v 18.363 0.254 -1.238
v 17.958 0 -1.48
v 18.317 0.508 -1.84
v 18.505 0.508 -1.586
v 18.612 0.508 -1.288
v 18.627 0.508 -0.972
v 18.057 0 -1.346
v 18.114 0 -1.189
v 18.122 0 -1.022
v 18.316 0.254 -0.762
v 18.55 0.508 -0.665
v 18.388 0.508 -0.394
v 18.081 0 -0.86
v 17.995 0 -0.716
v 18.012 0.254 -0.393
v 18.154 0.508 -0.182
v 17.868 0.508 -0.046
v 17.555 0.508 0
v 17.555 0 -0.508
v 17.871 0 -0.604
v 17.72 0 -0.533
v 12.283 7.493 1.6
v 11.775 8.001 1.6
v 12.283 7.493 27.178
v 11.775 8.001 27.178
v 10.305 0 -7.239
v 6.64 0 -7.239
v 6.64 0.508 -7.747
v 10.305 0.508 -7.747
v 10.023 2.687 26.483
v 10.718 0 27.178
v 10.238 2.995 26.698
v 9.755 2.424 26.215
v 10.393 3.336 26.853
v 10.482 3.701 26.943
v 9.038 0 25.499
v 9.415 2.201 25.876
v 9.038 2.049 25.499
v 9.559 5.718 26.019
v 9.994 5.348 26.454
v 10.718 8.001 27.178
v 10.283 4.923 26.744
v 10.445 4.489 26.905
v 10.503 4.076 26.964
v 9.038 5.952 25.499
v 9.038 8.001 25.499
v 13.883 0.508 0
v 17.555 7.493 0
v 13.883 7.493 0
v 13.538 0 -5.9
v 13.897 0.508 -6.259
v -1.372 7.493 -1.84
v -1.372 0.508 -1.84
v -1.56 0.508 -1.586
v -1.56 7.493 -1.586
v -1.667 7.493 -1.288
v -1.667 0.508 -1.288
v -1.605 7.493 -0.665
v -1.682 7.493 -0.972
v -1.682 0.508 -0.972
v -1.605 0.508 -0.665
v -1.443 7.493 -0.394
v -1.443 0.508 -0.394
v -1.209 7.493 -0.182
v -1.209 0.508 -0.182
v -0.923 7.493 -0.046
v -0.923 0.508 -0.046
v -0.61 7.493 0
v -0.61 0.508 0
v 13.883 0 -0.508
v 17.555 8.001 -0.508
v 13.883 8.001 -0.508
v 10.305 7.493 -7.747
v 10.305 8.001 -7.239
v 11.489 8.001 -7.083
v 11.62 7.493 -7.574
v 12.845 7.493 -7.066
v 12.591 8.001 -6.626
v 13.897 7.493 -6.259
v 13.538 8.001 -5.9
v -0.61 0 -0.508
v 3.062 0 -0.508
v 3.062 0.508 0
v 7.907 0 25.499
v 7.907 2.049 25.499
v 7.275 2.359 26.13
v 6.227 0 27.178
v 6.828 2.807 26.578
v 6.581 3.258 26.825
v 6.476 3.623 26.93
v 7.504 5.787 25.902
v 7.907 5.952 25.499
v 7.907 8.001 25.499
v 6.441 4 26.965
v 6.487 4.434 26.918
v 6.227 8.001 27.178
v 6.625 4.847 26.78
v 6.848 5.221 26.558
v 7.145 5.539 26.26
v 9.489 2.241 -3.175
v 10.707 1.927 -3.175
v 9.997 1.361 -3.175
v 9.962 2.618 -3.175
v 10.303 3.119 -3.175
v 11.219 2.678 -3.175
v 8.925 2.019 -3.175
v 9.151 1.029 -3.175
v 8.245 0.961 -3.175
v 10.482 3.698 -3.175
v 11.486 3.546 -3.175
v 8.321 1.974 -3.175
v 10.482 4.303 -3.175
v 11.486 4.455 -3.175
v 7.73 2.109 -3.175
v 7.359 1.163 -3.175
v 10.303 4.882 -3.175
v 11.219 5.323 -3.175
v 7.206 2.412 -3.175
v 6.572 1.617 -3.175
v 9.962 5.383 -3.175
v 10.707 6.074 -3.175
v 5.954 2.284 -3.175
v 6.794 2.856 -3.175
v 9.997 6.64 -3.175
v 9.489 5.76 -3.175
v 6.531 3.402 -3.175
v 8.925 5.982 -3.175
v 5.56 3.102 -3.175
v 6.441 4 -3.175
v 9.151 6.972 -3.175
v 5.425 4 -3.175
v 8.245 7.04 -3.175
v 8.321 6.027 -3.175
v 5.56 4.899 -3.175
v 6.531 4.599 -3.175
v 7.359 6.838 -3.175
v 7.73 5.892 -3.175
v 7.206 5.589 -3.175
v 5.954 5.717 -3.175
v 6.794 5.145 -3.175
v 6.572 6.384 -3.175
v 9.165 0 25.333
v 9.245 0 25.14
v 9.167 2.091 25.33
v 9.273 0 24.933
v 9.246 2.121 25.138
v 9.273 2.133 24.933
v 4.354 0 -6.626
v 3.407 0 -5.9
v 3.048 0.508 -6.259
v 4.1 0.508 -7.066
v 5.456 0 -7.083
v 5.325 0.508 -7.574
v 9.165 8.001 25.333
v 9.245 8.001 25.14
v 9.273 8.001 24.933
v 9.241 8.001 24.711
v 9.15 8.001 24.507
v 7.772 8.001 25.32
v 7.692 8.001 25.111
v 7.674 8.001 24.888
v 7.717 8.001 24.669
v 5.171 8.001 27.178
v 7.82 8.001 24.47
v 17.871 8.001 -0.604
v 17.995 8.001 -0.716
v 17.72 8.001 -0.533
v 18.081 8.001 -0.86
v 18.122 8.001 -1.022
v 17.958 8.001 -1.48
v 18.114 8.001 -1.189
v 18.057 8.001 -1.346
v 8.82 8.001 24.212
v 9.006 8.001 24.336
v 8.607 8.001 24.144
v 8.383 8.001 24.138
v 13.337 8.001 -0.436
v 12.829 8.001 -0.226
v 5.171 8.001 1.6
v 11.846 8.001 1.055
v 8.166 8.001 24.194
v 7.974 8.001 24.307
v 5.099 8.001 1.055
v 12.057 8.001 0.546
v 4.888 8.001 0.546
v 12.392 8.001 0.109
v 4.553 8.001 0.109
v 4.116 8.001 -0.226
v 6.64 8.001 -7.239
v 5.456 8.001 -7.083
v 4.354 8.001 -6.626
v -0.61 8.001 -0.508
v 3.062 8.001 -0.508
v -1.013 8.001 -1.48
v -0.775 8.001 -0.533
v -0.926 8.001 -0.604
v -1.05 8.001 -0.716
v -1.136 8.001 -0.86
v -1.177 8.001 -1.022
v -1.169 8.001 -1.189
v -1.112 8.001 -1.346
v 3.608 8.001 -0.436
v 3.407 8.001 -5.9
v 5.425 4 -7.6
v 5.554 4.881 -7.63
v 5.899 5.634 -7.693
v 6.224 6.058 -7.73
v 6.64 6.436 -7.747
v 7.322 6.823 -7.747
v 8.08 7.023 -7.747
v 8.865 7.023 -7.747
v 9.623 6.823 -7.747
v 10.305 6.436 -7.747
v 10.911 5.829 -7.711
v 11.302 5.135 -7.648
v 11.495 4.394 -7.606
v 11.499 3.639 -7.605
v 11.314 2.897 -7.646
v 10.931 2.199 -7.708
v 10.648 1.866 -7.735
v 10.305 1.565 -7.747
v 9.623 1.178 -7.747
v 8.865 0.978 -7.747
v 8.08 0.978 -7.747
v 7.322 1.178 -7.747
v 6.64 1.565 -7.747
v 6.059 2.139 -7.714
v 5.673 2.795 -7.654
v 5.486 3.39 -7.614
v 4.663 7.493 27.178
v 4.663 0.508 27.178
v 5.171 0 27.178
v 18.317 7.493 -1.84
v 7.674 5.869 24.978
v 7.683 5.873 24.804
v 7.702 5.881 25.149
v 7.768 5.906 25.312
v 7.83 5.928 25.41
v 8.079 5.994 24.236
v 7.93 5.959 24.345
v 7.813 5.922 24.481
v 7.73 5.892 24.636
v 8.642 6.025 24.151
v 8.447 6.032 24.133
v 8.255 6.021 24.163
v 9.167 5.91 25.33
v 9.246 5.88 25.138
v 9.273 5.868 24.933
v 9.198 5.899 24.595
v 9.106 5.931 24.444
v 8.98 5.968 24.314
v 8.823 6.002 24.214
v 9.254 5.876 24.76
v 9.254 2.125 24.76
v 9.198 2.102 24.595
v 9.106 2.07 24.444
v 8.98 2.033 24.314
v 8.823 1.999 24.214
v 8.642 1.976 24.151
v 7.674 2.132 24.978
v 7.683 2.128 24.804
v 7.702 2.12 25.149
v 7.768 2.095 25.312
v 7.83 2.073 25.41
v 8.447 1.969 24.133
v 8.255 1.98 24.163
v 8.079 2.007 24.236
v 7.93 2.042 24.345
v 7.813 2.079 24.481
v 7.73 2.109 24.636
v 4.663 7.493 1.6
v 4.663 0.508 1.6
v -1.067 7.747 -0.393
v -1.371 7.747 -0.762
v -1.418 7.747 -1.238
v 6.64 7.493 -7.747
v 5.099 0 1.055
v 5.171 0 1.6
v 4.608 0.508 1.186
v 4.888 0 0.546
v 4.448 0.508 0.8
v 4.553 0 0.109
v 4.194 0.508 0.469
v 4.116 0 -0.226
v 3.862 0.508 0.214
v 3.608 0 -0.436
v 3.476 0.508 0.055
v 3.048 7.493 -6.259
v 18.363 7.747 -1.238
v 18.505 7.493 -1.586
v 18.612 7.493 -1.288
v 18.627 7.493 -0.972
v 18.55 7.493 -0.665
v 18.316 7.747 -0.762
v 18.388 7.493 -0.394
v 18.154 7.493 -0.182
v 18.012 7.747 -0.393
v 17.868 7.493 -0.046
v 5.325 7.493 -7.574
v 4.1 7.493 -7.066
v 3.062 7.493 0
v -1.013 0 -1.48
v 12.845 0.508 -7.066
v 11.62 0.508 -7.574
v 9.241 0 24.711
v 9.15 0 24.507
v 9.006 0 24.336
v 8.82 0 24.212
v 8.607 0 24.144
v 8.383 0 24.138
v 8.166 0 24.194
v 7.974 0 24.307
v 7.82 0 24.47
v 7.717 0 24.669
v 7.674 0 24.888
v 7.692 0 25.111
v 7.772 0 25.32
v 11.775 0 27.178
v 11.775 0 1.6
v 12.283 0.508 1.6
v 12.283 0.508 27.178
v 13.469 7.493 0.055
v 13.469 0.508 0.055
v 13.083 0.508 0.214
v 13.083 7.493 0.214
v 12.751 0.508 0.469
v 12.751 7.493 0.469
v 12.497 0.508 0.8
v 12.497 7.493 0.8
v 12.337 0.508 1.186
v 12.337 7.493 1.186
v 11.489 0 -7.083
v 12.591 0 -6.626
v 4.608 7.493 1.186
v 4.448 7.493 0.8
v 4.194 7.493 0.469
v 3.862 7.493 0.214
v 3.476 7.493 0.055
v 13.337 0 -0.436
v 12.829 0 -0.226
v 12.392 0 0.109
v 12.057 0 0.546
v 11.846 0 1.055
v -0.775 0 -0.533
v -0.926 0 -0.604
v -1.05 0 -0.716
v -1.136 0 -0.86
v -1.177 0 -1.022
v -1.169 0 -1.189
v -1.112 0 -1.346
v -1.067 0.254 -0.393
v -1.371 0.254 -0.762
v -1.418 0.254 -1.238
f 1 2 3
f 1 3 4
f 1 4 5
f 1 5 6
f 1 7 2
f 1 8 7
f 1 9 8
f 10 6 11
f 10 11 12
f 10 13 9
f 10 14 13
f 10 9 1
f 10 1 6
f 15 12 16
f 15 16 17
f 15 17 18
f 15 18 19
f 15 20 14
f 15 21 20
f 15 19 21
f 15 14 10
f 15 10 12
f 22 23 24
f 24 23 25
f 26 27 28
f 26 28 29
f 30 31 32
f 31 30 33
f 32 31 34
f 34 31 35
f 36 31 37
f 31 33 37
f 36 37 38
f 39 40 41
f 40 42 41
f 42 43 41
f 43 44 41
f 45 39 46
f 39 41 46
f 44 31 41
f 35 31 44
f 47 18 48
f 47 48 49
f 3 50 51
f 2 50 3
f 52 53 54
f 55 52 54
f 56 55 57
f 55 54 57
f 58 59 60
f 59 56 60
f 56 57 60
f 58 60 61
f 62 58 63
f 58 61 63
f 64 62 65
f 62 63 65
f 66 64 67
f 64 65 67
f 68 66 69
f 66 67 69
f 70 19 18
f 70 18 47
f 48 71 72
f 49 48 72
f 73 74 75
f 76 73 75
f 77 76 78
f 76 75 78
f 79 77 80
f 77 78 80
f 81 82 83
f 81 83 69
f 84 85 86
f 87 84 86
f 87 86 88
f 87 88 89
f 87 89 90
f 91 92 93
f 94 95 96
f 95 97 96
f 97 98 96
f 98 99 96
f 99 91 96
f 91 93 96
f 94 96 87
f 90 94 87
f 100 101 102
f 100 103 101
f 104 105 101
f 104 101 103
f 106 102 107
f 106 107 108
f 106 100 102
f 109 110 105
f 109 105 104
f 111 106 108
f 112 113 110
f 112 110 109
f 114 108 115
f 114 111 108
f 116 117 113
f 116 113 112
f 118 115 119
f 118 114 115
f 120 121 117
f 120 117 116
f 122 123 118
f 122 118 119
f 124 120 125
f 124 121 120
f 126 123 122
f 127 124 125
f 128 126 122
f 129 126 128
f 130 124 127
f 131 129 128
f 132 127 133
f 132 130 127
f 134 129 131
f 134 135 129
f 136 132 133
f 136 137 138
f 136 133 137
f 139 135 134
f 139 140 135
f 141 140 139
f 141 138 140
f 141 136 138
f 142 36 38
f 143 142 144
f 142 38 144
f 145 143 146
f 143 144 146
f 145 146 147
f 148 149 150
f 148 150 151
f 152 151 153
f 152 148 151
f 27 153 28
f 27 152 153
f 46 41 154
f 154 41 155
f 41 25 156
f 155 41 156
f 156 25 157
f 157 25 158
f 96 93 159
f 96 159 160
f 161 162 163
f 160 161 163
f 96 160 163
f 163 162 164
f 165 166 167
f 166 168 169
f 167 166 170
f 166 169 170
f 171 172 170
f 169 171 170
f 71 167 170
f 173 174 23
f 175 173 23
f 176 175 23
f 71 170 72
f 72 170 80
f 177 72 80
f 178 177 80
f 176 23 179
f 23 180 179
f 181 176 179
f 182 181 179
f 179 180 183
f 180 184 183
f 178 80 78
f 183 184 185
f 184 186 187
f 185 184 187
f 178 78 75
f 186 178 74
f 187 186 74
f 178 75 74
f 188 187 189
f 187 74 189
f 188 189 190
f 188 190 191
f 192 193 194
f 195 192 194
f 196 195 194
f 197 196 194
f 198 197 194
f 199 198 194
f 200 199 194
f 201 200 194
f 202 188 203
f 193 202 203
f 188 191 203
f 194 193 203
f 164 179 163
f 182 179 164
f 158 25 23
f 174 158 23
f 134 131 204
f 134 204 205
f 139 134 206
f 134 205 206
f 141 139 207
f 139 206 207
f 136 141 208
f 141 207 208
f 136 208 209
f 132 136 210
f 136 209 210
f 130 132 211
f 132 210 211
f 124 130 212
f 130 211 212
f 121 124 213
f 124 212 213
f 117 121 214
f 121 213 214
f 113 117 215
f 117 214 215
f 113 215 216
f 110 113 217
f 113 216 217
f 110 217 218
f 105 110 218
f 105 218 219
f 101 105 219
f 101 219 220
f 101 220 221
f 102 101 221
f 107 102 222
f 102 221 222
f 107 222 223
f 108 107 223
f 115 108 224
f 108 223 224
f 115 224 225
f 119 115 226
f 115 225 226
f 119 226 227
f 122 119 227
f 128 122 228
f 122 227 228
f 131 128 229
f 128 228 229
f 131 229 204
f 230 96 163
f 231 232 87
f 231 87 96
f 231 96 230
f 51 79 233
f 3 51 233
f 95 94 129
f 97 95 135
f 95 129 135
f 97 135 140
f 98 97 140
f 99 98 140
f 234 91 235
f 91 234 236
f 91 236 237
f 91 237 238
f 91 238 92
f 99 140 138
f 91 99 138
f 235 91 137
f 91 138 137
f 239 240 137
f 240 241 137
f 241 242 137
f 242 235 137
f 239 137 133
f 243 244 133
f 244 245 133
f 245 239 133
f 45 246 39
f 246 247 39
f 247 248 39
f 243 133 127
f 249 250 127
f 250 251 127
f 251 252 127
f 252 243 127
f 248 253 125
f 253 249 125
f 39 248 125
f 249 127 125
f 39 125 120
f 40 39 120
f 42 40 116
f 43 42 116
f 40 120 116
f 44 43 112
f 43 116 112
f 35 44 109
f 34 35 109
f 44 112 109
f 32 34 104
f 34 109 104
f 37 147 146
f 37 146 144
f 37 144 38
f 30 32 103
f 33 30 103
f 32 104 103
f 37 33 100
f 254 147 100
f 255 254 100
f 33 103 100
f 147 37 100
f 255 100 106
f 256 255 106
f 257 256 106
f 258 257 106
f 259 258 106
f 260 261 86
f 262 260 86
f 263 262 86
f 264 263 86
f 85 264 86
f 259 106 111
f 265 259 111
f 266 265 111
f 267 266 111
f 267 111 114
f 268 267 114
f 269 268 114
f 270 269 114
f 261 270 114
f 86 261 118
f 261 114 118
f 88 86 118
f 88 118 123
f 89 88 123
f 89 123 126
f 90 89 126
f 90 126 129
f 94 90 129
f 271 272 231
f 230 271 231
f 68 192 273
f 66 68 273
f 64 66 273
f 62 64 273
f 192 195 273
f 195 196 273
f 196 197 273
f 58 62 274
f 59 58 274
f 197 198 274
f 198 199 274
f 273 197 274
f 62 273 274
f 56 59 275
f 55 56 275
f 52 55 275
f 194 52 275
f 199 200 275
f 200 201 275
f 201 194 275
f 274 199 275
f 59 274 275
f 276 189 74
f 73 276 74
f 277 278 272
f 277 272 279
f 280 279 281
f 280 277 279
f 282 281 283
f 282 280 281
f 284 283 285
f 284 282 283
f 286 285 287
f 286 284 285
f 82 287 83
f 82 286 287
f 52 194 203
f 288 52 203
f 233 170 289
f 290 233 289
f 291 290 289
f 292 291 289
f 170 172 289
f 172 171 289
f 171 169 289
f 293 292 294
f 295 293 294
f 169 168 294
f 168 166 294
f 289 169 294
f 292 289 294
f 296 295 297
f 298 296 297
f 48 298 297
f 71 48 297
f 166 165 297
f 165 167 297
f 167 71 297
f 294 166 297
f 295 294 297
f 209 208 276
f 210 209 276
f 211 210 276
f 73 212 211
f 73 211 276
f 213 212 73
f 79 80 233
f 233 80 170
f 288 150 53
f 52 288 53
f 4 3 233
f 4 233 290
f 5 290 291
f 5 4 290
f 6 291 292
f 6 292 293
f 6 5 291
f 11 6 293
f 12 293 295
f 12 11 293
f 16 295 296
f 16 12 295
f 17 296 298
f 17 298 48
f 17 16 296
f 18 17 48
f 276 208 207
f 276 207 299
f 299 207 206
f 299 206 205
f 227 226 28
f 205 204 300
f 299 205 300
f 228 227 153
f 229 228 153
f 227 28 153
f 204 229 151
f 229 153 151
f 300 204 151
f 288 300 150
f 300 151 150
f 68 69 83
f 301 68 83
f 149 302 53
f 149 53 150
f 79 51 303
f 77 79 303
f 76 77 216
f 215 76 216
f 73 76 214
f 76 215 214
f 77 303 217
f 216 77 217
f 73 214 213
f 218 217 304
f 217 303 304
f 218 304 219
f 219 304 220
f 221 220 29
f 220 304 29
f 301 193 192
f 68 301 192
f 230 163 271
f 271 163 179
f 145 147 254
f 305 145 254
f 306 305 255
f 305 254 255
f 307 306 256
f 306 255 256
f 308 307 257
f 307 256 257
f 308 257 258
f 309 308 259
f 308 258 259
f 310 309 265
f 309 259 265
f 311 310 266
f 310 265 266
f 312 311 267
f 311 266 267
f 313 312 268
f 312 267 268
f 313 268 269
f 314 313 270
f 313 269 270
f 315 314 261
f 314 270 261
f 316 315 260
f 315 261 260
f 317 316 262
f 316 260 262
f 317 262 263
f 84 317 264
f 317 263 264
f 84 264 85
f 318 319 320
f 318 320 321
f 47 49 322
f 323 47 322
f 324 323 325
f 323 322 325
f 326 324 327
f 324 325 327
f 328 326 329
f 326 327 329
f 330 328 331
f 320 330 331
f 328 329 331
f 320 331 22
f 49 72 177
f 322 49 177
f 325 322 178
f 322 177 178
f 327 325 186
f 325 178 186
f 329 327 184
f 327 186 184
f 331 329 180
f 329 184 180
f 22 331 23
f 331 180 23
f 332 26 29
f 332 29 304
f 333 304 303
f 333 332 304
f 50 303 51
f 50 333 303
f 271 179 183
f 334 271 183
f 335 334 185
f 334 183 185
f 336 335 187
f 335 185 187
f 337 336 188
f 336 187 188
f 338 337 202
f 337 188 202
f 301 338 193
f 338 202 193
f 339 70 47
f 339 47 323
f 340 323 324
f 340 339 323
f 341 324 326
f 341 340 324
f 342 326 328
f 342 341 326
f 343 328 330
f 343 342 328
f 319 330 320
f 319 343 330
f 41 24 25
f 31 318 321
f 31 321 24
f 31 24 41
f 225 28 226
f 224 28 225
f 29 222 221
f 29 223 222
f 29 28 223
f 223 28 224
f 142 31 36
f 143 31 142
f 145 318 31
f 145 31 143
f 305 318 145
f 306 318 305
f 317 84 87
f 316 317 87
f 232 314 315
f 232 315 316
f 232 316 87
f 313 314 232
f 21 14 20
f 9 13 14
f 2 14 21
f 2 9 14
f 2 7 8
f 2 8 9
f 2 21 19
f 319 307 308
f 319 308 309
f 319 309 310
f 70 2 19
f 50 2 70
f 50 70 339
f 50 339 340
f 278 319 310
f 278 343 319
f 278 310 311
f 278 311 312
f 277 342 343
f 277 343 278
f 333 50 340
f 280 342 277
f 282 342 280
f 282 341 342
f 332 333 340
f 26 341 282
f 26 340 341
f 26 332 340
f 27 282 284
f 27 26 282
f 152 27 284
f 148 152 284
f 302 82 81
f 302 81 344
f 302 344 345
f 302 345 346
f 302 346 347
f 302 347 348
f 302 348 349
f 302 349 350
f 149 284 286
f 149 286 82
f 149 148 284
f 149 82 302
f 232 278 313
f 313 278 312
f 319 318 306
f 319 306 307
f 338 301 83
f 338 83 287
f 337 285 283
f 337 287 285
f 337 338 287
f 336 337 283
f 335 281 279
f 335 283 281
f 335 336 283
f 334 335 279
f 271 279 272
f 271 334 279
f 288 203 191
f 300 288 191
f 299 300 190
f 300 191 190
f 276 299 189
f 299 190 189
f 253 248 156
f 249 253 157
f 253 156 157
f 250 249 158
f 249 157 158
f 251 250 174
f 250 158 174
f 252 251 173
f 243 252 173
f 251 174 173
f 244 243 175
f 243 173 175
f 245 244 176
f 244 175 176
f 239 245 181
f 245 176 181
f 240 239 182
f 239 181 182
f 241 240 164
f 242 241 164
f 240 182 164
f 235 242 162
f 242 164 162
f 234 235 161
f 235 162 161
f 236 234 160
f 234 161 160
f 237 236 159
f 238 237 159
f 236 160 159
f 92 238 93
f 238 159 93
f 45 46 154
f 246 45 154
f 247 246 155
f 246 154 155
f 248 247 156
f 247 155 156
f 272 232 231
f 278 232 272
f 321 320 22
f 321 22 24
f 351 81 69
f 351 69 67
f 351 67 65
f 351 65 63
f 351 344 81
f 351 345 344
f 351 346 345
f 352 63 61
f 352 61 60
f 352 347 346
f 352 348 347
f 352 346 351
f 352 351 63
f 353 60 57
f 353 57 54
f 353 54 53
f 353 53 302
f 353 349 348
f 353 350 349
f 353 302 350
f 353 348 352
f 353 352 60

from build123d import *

# Parameters (mm, degrees)
SKETCH1_R           = 1.077630735
BOSS_EXTRUDE1_DEPTH = 8.001
SKETCH4_R           = 2.032
CUT_EXTRUDE1_DEPTH  = 50.8
SKETCH5_R           = 3.048
CUT_EXTRUDE2_DEPTH  = 4.572
CUT_EXTRUDE4_DEPTH  = 34.909144773
FILLET2_R           = 5.08
FILLET3_R           = 1.6002
CHAMFER1_SIZE       = 0.508


with BuildPart() as part:
    # Sketch1 → Boss-Extrude1 (new body)
    with BuildSketch(Plane(origin=(0, 0, 0), x_dir=(1, 0, 0), z_dir=(0, 1, 0))):
        with BuildLine():
            Line((-0.609859659, 0), (0, 0))
            Line((0, 0), (4.662509606, 0))
            Line((4.662509606, 0), (4.662509606, -27.178))
            Line((4.662509606, -27.178), (8.472509606, -27.178))
            Line((8.472509606, -27.178), (8.472509606, 7.747))
            Line((8.472509606, 7.747), (4.535509606, 7.747))
            Line((4.535509606, 7.747), (-1.371859637, 1.839630756))
            ThreePointArc((-1.371859637, 1.839630756), (-0.197468217, 2.073231708), (0.467771075, 1.077630735))
            ThreePointArc((0.467771075, 1.077630735), (0.152140341, 0.315630735), (-0.609859659, 0))
        make_face()
        with Locations((-0.609859659, 1.077630735)):
            Circle(SKETCH1_R)
    boss_extrude1 = extrude(amount=BOSS_EXTRUDE1_DEPTH)

    # Mirror1: Boss-Extrude1 across plane
    add(boss_extrude1.mirror(Plane(origin=(8.472509606, 0, 0), x_dir=(0, 0, 1), z_dir=(1, 0, 0))))

    # Sketch4 → Cut-Extrude1 (cut)
    with BuildSketch(Plane(origin=(0, 0, -7.747), x_dir=(-1, 0, 0), z_dir=(0, 0, -1))):
        with Locations((-8.472509606, 4.0005)):
            Circle(SKETCH4_R)
    extrude(amount=-CUT_EXTRUDE1_DEPTH, mode=Mode.SUBTRACT)

    # Sketch5 → Cut-Extrude2 (cut)
    with BuildSketch(Plane(origin=(0, 0, -7.747), x_dir=(-1, 0, 0), z_dir=(0, 0, -1))):
        with Locations((-8.472509606, 4.0005)):
            Circle(SKETCH5_R)
    extrude(amount=-CUT_EXTRUDE2_DEPTH, mode=Mode.SUBTRACT)

    # Sketch7 → Cut-Extrude4 (cut, through all)
    with BuildSketch(Plane(origin=(0, 8.001, 0), x_dir=(1, 0, 0), z_dir=(0, 1, 0))):
        with BuildLine():
            ThreePointArc((9.272609606, -24.93293597), (8.166324592, -24.193739956), (7.906753471, -25.498692105))
            Line((7.906753471, -25.498692105), (8.472509606, -24.93293597))
            Line((8.472509606, -24.93293597), (9.038265742, -25.498692105))
            ThreePointArc((9.038265742, -25.498692105), (9.21170562, -25.239120984), (9.272609606, -24.93293597))
        make_face()
        with BuildLine():
            Line((8.472509606, -24.93293597), (7.906753471, -25.498692105))
            ThreePointArc((7.906753471, -25.498692105), (8.472509606, -25.73303597), (9.038265742, -25.498692105))
            Line((9.038265742, -25.498692105), (8.472509606, -24.93293597))
        make_face()
        with BuildLine():
            Line((7.906753471, -25.498692105), (6.227445576, -27.178))
            Line((6.227445576, -27.178), (10.717573636, -27.178))
            Line((10.717573636, -27.178), (9.038265742, -25.498692105))
            ThreePointArc((9.038265742, -25.498692105), (8.472509606, -25.73303597), (7.906753471, -25.498692105))
        make_face()
    extrude(amount=-CUT_EXTRUDE4_DEPTH, mode=Mode.SUBTRACT)

    # Fillet2
    # the kernel refuses this fillet: 5.08 mm, written as the material it takes off along each edge
    with BuildSketch(Plane(origin=(4.535509606, -5.260512242, -7.747), x_dir=(-0.7071067811865458, 0, 0.7071067811865495), z_dir=(0, 1, 0)), Plane(origin=(12.409509606, -5.260512242, -7.747), x_dir=(-1, 0, 0), z_dir=(0, 1, 0))) as fillet2_piece_1:
        with BuildLine():
            CenterArc((FILLET2_R * 0.414213562373, FILLET2_R), FILLET2_R, 225, 45)
            Line((-FILLET2_R * 0.292893218813, FILLET2_R * 0.292893218813), (0, 0))
            Line((0, 0), (FILLET2_R * 0.414213562373, 0))
        make_face()
    extrude(amount=18.522024484, mode=Mode.SUBTRACT)

    # Fillet3
    fillet3_edges = [part.edges().sort_by_distance(p)[0] for p in [
        (4.662509606, 4.0005, 0),
        (12.282509606, 4.0005, 0),
    ]]
    fillet(fillet3_edges, radius=FILLET3_R)

    # Chamfer1
    chamfer1_edges = [part.edges().sort_by_distance(p)[0] for p in [
        (15.718794239, 0, 0),
        (15.718794239, 8.001, 0),
        (12.282509606, 0, 14.3891),
        (12.282509606, 8.001, 14.3891),
        (4.662509606, 0, 14.3891),
        (4.662509606, 8.001, 14.3891),
        (-1.605460644, 0, -0.66523932),
        (1.226224973, 0, 0),
        (1.226224973, 8.001, 0),
        (12.751197335, 0, 0.468687729),
        (12.751197335, 8.001, 0.468687729),
        (4.193821877, 0, 0.468687729),
        (4.193821877, 8.001, 0.468687729),
        (0.837876209, 0, -4.049366602),
        (16.107143004, 0, -4.049366602),
        (18.550479857, 8.001, -0.66523932),
        (16.107143004, 8.001, -4.049366602),
        (18.550479857, 0, -0.66523932),
        (0.837876209, 8.001, -4.049366602),
        (-1.605460644, 8.001, -0.66523932),
        (8.472509606, 0, -7.747),
        (12.249336546, 0, -7.360308025),
        (4.695682667, 0, -7.360308025),
        (8.472509606, 8.001, -7.747),
        (12.249336546, 8.001, -7.360308025),
        (4.695682667, 8.001, -7.360308025),
    ]]
    chamfer(chamfer1_edges, length=CHAMFER1_SIZE)


solid = part.part
